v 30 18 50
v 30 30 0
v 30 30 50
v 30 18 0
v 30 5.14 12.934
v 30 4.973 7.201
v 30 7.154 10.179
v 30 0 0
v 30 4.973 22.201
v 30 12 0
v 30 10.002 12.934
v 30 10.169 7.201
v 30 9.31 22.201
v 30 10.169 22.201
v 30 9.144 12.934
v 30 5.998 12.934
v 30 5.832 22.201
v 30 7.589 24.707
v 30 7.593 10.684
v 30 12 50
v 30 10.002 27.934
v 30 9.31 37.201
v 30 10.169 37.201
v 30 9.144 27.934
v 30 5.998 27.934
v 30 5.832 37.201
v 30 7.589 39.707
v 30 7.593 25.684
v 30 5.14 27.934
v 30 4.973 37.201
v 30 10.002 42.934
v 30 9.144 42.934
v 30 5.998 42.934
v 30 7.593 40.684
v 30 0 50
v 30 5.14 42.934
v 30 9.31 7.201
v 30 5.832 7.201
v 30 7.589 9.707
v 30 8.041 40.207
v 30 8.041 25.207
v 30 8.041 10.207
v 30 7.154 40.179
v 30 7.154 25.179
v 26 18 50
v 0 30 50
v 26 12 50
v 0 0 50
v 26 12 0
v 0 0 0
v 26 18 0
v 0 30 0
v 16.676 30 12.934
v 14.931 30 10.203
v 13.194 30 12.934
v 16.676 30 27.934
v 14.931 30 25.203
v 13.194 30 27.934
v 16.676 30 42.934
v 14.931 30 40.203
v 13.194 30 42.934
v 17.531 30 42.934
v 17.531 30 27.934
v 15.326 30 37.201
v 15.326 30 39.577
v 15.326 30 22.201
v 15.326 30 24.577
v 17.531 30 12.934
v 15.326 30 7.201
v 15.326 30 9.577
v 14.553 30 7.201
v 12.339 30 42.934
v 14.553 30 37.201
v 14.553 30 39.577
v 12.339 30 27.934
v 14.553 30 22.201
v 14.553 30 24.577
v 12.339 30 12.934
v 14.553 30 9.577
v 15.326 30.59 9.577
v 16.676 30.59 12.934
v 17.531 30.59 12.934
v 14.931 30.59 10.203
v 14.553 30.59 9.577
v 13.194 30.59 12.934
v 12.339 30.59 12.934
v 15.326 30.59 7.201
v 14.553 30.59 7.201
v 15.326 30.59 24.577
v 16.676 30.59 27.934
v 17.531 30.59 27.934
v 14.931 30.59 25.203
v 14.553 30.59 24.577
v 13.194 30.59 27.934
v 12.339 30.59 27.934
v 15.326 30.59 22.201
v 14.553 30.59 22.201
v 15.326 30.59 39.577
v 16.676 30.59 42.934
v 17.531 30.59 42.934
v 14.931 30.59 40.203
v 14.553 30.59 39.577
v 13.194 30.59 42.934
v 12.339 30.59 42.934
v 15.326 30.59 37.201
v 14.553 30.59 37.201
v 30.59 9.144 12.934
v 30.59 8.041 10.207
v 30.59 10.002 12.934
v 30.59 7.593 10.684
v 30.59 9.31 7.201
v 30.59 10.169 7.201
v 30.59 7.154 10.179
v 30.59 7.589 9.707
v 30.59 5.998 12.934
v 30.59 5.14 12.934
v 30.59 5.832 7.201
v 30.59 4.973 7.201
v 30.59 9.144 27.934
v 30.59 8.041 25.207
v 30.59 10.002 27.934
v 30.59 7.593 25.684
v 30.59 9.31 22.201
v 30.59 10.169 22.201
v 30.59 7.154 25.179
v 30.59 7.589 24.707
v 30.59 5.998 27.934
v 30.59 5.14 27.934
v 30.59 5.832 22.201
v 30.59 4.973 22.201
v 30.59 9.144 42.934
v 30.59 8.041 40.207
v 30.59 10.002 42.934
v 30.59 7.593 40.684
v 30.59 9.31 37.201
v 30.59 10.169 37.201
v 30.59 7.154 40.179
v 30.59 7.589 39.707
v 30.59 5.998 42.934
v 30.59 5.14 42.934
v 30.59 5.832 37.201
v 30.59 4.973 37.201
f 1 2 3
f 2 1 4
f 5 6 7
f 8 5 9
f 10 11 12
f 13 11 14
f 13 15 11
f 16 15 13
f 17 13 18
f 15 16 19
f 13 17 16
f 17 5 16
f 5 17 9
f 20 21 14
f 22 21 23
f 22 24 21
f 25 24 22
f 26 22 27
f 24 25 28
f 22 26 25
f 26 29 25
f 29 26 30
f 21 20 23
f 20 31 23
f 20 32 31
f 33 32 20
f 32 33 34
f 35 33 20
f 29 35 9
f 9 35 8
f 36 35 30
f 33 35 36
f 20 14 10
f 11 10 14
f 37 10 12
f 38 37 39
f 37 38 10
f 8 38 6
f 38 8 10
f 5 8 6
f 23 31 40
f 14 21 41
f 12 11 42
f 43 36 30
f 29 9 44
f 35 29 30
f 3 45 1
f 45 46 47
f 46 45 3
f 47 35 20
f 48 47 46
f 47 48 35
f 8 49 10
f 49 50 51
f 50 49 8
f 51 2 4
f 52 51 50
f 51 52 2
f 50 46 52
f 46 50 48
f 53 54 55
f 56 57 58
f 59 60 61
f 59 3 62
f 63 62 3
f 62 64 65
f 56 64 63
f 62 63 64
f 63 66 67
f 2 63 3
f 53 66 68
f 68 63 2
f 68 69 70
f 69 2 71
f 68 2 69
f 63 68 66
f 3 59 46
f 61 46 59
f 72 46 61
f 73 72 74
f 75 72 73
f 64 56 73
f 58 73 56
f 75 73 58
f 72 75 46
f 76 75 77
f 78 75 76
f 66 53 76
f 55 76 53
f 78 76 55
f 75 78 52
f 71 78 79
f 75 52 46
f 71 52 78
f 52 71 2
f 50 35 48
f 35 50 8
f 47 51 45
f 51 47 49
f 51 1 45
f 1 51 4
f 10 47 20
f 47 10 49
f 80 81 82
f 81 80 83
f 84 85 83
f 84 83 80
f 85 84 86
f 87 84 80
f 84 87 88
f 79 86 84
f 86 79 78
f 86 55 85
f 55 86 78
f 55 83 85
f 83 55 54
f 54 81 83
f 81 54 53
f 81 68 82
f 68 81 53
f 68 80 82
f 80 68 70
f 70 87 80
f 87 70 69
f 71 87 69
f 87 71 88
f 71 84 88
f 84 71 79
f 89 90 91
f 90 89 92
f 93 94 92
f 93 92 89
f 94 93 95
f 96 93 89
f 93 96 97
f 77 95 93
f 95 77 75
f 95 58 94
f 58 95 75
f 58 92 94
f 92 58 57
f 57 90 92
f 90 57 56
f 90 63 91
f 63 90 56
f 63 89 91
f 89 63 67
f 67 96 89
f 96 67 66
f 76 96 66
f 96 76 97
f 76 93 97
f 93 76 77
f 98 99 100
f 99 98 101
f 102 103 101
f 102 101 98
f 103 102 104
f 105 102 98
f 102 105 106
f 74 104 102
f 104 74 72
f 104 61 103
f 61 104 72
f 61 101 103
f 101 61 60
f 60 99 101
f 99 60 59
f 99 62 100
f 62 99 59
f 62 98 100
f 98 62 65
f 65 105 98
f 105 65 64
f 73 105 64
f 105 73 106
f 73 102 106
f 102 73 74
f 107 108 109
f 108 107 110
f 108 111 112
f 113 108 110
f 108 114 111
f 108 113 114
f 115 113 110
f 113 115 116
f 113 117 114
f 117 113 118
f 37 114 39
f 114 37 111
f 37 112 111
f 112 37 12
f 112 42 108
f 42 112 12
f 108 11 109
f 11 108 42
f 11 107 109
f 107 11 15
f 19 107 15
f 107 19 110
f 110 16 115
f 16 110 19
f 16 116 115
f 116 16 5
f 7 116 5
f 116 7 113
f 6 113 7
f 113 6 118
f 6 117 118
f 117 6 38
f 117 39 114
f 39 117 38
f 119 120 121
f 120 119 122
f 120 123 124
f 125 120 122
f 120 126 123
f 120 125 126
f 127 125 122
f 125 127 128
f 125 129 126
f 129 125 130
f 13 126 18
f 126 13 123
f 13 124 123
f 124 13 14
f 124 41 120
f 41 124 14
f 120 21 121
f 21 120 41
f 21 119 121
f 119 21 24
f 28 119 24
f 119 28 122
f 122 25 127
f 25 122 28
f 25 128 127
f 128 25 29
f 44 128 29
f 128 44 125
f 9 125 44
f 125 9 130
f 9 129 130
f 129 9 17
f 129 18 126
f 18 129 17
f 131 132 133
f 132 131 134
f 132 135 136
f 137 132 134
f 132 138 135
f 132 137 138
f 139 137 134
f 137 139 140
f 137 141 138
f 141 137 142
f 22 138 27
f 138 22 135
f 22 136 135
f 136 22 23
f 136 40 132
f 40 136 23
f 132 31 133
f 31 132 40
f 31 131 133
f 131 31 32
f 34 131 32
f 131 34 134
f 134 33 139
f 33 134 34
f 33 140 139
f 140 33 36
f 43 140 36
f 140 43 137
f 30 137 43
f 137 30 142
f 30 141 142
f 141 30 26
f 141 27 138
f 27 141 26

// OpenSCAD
// ---------------------------------------------------------------
// ringing_tower.scad  -  surface ripples ("ghosting") test
// Used in: Level 3 exercise L3-2
//
// A tall block with sharp vertical edges, a notch and raised text on
// one side.  Ringing shows as repeating ripples that echo the sharp
// features along the X and Y faces after fast direction changes.
// Print at normal speed/acceleration, inspect, then change
// acceleration or input-shaping settings and compare.
// Units: millimeters.
// ---------------------------------------------------------------

width   = 30;     // X size
depth   = 30;     // Y size
height  = 50;     // Z size
notch_w = 6;      // width of the square notch cut into the +X face
notch_d = 4;      // depth of the notch
text_h  = 6;      // text size
relief  = 0.6;    // raised text height
label_x = "X";    // letter on the +X face
label_y = "Y";    // letter on the +Y face

difference() {
    cube([width, depth, height]);
    // vertical notch on the +X face to create sharp inside corners
    translate([width - notch_d, depth / 2 - notch_w / 2, -1])
        cube([notch_d + 1, notch_w, height + 2]);
}

// raised letters repeated along the height so each shows ringing echoes
for (z = [10 : 15 : height - 10]) {
    // on the +Y face
    translate([width / 2, depth - 0.01, z])
        rotate([90, 0, 180])
            linear_extrude(relief)
                text(label_y, size = text_h, halign = "center", valign = "center");
}
for (z = [10 : 15 : height - 10]) {
    // on the +X face, left of the notch (toward y = 0)
    translate([width - 0.01, depth / 4, z])
        rotate([90, 0, 90])
            linear_extrude(relief)
                text(label_x, size = text_h, halign = "center", valign = "center");
}
